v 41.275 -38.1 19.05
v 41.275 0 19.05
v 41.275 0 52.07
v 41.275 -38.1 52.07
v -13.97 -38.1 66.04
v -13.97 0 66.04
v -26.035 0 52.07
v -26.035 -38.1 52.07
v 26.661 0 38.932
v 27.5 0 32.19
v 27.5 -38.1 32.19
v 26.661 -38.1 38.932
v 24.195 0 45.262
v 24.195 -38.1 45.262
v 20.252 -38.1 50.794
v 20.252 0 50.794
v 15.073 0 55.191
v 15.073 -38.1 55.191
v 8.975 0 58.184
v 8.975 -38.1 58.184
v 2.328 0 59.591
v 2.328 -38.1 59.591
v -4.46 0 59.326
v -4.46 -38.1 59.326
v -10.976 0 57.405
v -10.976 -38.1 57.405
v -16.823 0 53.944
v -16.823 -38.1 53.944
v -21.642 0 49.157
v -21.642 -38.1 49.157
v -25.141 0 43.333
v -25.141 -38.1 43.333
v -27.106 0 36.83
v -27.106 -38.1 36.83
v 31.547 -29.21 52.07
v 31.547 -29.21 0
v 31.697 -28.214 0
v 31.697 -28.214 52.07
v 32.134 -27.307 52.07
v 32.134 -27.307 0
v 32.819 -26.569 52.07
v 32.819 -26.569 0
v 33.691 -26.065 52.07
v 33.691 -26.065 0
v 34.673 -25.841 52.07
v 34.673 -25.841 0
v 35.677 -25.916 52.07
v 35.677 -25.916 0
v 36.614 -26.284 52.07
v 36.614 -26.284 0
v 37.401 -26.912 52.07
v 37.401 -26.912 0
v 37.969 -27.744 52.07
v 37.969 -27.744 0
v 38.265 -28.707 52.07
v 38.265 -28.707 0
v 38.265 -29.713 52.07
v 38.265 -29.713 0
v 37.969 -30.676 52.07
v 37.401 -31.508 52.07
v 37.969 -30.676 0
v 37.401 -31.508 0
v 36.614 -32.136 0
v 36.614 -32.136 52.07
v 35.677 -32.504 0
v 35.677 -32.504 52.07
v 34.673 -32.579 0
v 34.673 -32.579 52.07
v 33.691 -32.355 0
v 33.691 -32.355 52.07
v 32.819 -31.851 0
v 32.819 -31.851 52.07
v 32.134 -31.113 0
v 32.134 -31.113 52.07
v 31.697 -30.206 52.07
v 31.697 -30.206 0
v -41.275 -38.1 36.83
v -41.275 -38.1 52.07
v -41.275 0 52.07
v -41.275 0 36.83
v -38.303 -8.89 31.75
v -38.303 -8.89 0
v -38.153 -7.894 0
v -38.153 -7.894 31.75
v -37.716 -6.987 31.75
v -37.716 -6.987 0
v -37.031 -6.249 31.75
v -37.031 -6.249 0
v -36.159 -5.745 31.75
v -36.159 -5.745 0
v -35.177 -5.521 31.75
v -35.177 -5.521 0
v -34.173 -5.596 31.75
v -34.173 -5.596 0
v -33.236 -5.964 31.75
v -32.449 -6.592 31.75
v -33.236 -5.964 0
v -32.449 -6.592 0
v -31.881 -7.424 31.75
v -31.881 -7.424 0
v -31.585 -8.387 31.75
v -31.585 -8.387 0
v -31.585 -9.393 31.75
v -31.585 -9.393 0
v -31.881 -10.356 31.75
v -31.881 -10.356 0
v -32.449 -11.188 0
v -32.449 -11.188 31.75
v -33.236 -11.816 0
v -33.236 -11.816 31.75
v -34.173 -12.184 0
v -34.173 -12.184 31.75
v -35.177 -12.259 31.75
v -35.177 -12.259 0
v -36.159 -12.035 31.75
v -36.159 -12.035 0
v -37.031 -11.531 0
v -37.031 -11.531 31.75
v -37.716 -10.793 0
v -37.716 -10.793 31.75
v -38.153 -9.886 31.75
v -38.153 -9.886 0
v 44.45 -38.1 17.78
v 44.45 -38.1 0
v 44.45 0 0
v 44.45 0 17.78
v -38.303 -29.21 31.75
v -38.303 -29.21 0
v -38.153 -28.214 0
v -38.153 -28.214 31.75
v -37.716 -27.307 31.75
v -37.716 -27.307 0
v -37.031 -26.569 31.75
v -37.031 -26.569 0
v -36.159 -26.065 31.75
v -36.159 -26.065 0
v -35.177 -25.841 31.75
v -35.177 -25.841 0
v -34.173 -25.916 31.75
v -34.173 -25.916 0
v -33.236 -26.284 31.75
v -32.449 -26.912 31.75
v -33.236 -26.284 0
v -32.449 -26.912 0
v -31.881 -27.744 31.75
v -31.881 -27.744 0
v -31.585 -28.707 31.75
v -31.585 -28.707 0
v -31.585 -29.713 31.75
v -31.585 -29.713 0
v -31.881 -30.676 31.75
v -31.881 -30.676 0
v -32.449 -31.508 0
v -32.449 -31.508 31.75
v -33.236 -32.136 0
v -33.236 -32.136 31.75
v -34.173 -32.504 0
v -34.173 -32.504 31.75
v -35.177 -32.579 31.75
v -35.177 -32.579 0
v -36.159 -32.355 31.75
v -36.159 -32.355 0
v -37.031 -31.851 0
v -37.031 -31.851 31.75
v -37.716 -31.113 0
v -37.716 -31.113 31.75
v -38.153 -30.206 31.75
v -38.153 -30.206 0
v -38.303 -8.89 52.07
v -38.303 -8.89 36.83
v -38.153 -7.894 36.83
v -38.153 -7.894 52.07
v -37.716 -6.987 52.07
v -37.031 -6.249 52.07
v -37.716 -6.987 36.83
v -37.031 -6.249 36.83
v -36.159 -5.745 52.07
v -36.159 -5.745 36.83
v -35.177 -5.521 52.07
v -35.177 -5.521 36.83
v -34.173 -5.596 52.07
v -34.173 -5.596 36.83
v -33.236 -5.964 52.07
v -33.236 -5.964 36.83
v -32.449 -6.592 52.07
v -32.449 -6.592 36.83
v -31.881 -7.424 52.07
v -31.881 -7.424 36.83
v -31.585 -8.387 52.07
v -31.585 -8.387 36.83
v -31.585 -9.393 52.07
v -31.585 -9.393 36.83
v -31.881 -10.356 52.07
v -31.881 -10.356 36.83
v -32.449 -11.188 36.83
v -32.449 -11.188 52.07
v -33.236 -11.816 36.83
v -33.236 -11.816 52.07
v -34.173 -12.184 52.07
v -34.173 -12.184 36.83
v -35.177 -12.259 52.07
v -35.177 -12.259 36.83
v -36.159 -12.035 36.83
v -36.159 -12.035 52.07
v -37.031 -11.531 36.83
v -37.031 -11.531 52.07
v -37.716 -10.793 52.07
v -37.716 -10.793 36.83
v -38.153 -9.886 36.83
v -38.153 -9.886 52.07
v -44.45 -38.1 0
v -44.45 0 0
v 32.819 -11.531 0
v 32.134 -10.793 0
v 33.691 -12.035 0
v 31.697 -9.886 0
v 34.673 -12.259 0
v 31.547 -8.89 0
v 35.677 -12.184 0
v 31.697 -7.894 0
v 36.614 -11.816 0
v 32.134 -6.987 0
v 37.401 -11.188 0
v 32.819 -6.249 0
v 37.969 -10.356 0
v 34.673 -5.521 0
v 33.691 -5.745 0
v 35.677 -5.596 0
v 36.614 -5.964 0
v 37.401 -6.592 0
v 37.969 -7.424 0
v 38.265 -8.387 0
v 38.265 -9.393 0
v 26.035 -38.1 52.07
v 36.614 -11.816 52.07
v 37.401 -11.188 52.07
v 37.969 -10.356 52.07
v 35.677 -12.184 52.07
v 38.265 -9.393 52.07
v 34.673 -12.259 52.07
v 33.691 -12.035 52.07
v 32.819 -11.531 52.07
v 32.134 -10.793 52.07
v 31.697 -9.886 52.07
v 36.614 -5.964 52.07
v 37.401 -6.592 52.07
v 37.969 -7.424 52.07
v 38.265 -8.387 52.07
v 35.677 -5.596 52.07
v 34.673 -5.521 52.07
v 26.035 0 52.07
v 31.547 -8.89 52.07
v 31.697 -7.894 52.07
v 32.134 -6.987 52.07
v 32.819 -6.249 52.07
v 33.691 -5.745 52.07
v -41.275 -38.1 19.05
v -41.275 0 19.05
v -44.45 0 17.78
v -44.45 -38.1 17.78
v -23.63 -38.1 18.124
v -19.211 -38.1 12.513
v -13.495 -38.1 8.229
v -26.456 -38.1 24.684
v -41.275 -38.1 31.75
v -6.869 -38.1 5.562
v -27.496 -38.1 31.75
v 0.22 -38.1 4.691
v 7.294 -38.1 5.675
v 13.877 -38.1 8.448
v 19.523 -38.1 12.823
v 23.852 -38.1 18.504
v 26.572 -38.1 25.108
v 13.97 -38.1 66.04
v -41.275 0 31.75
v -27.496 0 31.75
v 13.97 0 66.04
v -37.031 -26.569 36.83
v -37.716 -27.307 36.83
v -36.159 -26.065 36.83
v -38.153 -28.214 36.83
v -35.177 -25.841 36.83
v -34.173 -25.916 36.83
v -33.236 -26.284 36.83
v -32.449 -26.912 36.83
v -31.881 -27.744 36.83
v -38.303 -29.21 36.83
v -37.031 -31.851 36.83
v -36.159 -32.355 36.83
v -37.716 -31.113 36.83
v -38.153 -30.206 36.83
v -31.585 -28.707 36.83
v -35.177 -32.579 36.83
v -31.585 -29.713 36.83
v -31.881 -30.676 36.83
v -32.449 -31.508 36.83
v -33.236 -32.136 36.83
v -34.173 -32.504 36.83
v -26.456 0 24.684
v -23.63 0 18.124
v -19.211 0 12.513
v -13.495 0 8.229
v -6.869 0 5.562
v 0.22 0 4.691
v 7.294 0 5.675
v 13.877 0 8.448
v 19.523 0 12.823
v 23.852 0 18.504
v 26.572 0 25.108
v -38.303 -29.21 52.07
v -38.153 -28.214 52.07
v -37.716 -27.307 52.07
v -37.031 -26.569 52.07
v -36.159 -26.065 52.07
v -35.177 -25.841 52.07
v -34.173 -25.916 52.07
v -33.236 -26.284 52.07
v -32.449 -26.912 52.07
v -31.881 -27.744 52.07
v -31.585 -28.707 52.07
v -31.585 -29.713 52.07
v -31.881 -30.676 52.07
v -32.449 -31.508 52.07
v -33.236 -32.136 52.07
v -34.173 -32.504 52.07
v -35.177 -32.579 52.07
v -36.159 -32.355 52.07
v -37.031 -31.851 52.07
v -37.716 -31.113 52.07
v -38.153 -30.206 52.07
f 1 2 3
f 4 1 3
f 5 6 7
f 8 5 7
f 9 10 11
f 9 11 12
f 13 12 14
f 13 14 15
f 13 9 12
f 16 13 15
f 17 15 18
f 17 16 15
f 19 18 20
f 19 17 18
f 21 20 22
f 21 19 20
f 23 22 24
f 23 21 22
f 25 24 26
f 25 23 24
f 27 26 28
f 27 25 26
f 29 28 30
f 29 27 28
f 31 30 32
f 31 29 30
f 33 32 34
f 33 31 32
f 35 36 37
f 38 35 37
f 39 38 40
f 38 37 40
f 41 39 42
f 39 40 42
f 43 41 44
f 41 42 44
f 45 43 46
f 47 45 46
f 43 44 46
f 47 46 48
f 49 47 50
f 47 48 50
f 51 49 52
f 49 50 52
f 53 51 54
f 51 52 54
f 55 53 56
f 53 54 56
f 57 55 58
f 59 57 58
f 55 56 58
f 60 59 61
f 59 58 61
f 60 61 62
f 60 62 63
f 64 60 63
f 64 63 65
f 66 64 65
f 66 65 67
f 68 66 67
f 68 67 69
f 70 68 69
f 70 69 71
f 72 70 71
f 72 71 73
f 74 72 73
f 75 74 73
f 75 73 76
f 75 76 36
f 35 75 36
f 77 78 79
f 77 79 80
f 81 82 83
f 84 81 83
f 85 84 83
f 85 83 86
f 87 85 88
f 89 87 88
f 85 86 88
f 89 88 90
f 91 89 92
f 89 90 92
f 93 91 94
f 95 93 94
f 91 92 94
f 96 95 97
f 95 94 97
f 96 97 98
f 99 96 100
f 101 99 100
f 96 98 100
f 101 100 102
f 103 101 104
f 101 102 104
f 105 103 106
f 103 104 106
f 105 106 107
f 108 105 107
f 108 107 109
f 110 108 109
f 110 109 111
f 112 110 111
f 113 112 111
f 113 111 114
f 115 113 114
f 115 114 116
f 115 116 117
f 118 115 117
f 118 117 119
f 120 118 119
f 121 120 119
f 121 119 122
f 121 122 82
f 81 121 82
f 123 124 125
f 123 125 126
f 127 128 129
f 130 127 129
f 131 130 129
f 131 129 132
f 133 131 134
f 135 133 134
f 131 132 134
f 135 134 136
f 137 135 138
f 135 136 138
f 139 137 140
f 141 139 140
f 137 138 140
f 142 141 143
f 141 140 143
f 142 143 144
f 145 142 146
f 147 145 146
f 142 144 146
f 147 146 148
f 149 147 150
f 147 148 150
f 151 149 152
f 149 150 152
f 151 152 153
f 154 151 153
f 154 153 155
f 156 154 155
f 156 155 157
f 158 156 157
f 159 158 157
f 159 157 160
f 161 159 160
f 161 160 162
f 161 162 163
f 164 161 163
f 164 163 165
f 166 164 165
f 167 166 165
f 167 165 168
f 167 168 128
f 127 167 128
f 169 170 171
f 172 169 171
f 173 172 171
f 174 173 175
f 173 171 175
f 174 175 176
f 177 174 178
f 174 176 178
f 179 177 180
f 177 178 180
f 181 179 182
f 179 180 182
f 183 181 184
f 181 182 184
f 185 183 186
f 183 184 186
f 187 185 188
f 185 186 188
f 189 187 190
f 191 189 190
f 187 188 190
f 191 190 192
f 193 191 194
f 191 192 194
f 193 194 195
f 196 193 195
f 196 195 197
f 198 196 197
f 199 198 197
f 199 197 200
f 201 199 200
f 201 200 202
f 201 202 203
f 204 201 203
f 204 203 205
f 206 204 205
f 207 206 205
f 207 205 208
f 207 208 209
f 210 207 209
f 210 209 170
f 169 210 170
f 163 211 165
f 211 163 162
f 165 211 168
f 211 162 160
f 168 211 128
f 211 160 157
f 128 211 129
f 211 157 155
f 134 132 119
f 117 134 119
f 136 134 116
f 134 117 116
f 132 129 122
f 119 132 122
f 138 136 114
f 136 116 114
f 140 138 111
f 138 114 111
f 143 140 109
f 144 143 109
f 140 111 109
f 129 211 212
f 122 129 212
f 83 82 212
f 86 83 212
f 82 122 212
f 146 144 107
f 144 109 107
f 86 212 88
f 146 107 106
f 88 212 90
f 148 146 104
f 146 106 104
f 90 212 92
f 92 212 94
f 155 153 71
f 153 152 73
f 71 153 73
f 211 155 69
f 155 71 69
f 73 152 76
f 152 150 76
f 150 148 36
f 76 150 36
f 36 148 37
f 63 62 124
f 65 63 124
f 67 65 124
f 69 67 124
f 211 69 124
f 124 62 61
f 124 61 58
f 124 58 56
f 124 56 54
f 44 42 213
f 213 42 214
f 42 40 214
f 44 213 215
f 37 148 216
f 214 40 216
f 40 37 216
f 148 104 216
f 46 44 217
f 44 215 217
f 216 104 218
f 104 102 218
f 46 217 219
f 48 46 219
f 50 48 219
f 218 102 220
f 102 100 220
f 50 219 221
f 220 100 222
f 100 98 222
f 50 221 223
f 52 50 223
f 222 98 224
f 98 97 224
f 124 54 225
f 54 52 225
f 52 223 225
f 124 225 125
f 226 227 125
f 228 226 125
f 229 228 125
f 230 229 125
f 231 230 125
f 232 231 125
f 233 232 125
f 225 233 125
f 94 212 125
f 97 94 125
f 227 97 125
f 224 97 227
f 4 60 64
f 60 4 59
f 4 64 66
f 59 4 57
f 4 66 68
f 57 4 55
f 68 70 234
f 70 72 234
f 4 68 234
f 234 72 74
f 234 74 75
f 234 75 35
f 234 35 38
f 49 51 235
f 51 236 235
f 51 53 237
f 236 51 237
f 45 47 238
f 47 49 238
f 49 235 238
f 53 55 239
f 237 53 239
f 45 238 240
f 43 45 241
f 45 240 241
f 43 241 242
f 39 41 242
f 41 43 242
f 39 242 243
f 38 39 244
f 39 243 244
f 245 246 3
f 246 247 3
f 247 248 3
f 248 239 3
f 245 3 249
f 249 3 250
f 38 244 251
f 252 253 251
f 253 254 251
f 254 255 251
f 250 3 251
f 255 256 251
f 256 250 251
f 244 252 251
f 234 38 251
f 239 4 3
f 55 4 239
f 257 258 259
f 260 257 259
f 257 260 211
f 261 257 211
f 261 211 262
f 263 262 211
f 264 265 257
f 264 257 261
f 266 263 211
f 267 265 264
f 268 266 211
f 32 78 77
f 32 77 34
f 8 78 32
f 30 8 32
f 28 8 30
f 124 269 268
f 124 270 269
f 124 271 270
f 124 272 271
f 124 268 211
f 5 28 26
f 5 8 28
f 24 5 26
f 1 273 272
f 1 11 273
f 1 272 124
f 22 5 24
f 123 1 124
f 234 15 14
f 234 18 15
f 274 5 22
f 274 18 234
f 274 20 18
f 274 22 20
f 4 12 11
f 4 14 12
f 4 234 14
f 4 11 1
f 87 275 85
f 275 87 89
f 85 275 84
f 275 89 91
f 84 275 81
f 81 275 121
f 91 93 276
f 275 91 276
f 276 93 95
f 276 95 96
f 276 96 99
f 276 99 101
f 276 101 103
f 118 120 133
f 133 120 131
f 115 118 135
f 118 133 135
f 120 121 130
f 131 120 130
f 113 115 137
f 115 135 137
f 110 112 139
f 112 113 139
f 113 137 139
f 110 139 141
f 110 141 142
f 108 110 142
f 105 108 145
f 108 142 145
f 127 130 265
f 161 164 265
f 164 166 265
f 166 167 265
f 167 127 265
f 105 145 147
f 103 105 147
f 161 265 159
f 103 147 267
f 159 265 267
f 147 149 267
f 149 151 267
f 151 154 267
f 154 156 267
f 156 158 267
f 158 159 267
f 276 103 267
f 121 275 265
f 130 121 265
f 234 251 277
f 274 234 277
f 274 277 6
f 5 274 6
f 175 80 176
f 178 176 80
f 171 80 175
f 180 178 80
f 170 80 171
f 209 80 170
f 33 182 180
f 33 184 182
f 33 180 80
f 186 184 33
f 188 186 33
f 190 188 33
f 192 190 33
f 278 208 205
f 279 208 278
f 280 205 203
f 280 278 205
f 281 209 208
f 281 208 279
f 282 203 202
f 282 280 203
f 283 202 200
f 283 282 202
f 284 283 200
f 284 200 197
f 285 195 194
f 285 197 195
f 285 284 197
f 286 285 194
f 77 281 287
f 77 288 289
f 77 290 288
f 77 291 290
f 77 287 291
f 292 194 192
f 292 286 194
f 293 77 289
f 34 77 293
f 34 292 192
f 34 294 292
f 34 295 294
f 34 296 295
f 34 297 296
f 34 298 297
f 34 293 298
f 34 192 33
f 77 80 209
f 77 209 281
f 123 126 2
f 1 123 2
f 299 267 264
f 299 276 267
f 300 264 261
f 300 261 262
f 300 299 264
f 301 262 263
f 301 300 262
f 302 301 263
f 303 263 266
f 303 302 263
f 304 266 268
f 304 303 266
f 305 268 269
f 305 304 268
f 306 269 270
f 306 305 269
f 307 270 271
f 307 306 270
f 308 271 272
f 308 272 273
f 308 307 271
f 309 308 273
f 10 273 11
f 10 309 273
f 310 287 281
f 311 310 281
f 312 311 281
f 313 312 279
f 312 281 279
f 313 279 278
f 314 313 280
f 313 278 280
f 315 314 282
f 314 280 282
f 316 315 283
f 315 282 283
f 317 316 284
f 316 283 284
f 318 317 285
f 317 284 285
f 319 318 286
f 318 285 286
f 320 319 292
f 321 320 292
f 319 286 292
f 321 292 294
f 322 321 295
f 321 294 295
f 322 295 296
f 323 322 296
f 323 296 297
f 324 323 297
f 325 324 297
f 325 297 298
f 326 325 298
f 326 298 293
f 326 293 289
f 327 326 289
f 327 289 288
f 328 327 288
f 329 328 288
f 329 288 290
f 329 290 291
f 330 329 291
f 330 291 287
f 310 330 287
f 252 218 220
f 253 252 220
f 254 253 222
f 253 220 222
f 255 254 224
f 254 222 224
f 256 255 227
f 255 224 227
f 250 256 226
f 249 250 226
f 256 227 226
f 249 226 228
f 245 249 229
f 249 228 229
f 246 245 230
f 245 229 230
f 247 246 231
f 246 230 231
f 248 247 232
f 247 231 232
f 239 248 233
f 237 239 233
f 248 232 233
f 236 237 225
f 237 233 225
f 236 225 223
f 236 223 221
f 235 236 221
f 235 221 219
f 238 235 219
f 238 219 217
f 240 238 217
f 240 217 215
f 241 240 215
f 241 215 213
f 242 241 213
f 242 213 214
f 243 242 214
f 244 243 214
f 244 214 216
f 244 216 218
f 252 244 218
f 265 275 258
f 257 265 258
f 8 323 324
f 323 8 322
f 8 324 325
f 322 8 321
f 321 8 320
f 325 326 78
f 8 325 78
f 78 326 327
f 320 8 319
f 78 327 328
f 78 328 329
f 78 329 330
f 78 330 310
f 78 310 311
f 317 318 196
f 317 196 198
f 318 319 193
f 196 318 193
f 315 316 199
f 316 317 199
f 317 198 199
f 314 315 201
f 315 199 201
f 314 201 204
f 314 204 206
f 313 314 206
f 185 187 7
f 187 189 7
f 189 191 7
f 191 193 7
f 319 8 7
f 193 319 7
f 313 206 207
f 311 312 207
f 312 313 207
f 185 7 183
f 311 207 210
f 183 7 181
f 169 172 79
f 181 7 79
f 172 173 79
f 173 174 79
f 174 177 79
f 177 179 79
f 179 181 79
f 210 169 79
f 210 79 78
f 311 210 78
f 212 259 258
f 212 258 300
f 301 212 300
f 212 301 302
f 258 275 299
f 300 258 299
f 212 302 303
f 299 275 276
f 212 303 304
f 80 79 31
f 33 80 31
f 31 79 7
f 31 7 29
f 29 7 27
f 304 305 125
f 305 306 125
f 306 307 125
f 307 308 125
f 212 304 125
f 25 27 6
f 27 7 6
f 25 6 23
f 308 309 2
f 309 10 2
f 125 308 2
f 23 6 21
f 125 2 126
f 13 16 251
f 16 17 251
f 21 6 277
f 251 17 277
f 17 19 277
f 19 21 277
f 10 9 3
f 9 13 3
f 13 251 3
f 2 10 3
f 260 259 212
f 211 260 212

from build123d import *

# Parameters (mm, degrees)
F0_R     = 27.5
F1_DEPTH = 38.1
F2_W     = 19.05
F2_H     = 5.08
F3_DEPTH = 38.1
F5_D     = 6.7564


with BuildPart() as f1:
    # F0 (on Front) → F1 (new body)
    with BuildSketch(Plane.XZ):
        Polygon((-44.45, 0), (0, 0), (44.45, 0), (44.45, 17.78), (41.275, 19.05), (41.275, 52.07), (26.035, 52.07), (13.97, 66.04), (0, 66.04), (-13.97, 66.04), (-26.035, 52.07), (-41.275, 52.07), (-41.275, 19.05), (-44.45, 17.78), align=None)
        with Locations((0, 32.19)):
            Circle(F0_R, mode=Mode.SUBTRACT)
    extrude(amount=F1_DEPTH)

    # F2 (on face) → F3 (cut, through all)
    with BuildSketch(Plane.XZ.offset(38.1)):
        with Locations((-31.75, 34.29)):
            Rectangle(F2_W, F2_H)
    extrude(amount=-F3_DEPTH, mode=Mode.SUBTRACT)

    # F5 (through all)
    with Locations(Plane.XY.offset(52.07)):
        with Locations((-34.925, -8.89), (-34.925, -29.21), (34.925, -8.89), (34.925, -29.21)):
            Hole(F5_D / 2)


solid = f1.part
